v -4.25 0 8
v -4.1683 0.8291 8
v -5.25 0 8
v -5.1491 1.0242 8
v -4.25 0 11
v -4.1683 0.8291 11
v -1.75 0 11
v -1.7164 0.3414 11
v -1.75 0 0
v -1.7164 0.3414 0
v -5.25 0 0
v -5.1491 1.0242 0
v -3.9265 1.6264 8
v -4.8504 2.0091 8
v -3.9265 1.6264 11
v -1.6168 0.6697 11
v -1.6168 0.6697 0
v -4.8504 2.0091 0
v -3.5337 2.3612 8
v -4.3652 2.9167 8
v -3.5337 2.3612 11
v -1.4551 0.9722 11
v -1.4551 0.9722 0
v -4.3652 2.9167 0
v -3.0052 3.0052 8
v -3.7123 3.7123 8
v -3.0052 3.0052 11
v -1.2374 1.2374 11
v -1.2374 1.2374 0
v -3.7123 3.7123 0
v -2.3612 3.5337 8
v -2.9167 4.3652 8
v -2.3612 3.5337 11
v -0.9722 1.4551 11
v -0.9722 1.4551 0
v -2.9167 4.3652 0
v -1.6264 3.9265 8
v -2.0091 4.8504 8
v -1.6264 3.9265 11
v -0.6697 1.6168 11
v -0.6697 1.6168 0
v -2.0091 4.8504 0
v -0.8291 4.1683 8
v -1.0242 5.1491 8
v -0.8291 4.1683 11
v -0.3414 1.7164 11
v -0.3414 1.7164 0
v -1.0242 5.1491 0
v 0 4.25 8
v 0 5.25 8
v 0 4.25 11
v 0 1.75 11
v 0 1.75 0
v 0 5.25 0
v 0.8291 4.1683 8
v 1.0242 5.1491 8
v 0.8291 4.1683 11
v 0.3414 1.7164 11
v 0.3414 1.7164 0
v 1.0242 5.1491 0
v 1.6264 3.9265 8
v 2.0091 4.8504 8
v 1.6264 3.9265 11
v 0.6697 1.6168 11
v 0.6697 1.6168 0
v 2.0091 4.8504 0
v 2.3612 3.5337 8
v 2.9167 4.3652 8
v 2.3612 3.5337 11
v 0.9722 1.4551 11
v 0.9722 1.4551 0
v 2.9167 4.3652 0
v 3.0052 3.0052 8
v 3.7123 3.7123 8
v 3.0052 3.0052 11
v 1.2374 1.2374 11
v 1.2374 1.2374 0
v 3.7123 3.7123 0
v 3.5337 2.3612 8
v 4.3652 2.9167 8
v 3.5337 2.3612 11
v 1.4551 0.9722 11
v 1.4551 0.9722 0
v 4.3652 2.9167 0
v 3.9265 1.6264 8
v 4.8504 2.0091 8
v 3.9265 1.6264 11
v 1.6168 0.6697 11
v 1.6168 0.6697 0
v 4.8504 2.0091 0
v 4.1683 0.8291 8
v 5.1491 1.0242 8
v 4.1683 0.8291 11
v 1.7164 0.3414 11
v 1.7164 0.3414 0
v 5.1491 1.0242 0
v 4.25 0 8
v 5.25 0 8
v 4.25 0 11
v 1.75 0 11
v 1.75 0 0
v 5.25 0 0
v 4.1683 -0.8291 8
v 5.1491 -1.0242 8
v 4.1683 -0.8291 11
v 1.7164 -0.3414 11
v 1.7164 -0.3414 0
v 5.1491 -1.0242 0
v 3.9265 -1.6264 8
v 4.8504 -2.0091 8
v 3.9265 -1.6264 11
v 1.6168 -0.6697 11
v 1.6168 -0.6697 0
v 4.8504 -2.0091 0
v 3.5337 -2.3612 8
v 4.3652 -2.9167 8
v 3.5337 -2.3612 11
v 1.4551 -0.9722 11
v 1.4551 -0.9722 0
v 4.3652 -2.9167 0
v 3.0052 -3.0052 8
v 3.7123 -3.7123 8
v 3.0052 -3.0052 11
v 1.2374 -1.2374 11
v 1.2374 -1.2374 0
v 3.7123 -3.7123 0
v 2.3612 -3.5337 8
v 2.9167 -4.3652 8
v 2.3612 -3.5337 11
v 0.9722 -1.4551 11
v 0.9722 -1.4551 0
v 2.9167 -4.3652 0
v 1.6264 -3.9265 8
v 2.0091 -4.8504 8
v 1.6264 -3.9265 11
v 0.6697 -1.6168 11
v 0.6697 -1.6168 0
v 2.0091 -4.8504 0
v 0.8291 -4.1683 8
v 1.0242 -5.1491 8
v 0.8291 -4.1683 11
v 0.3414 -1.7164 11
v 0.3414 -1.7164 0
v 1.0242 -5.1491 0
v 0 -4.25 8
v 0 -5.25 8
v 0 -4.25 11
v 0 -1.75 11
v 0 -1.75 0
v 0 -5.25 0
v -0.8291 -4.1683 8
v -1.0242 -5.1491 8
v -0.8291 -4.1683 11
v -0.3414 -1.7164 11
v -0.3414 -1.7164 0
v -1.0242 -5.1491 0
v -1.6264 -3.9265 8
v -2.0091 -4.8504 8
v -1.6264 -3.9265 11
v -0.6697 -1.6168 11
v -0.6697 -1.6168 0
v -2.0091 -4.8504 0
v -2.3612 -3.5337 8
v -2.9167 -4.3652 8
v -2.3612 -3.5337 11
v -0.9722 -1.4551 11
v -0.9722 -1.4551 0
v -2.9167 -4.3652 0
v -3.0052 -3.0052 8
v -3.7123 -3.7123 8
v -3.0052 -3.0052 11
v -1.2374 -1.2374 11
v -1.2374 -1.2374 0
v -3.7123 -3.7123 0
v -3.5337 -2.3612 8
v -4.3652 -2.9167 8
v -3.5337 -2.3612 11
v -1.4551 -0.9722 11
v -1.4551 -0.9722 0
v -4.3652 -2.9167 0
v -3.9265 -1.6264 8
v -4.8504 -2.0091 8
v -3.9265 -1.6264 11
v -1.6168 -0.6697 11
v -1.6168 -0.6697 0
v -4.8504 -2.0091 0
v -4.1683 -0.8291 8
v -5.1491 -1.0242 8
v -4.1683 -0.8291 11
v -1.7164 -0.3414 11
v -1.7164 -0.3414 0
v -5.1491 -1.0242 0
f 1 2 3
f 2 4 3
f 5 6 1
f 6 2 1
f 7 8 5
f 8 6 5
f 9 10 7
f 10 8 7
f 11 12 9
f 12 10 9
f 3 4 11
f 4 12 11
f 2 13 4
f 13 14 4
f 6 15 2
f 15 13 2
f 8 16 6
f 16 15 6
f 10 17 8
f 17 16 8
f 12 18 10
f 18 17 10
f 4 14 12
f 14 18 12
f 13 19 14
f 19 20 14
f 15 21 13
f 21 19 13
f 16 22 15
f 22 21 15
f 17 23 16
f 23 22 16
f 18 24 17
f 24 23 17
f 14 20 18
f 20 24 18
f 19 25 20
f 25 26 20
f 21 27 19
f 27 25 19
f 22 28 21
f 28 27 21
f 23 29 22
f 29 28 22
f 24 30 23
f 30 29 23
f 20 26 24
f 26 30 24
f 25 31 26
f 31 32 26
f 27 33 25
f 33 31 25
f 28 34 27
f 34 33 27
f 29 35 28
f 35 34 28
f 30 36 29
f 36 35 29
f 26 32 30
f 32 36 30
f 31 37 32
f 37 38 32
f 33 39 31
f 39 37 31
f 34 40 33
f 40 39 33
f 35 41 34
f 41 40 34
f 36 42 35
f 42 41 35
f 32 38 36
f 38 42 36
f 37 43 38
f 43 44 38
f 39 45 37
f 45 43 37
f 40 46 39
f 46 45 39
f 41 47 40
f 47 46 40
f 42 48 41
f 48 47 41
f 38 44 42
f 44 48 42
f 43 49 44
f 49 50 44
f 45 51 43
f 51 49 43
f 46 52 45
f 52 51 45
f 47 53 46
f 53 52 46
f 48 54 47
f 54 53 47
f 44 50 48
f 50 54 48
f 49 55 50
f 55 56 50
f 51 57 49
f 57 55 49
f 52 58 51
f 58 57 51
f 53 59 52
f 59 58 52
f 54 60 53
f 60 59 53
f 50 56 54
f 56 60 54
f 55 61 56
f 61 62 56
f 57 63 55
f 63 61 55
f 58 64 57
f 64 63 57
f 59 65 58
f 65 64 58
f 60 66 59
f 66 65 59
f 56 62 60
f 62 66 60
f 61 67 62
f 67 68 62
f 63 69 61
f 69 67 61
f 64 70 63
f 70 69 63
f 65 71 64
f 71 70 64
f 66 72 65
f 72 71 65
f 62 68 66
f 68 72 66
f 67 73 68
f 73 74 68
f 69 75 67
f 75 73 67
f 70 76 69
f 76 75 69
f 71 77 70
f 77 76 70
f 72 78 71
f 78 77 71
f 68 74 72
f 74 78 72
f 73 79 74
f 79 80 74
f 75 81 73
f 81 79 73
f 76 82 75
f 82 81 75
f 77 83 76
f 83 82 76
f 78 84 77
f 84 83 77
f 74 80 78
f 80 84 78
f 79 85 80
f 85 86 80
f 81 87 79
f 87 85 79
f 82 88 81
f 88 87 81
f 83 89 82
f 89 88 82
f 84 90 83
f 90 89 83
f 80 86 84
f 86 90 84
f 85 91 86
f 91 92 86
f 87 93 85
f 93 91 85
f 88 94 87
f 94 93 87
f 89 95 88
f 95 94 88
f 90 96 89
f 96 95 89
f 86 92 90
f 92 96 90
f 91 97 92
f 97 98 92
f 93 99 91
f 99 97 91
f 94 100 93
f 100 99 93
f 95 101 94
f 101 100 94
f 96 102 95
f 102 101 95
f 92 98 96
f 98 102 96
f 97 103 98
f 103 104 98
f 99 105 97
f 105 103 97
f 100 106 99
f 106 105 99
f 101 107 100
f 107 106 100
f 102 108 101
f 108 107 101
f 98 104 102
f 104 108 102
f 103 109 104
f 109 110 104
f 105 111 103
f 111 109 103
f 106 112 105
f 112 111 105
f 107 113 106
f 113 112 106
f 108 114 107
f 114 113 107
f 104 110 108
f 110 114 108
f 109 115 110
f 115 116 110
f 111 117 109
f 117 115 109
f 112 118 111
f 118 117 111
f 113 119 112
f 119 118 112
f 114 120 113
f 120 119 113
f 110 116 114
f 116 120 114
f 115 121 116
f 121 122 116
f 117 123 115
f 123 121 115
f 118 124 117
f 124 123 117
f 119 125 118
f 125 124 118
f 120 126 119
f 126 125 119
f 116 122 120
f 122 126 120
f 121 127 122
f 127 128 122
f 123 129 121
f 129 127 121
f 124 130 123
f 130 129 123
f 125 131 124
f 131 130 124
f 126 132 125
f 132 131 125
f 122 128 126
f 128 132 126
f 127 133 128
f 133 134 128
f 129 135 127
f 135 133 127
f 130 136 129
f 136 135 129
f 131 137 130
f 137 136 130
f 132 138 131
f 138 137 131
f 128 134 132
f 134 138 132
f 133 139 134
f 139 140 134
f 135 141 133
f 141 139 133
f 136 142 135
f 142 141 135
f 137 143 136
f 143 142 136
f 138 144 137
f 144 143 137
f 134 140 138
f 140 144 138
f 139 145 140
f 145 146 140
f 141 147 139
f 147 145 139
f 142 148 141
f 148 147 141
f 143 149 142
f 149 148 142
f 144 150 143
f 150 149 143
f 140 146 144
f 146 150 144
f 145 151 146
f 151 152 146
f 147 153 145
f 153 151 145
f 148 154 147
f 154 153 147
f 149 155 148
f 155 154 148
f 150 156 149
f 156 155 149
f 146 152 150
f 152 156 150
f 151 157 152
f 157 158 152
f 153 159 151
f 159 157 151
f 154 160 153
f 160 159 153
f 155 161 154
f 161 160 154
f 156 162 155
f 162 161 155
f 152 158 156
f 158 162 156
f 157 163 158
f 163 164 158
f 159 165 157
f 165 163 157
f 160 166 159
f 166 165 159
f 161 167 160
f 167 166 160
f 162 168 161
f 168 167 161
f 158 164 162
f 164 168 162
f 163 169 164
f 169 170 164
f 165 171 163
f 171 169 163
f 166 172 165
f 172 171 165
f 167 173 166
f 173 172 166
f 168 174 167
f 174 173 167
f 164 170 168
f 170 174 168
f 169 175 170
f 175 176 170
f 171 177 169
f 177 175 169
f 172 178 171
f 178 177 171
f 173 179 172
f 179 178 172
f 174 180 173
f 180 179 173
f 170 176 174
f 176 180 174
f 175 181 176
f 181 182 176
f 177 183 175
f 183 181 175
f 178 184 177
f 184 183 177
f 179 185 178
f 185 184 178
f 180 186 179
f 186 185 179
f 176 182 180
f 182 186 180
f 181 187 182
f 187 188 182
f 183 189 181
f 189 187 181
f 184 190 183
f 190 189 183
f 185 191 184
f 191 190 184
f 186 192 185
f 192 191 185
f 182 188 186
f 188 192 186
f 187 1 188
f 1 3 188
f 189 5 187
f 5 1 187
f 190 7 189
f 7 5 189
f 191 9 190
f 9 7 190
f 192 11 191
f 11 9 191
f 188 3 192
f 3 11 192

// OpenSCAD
$fn = 32;

// ----------------------------------------------------------------------
// Form washer: stepped_c washer, 10.5 mm outside, 3.5 mm bore
// ----------------------------------------------------------------------

// --- parameters (mm) ---
revolve_angle = 360;      // full turn around the Z axis
profile_points = 6;       // points of the closed outline

profile = [[1.75, 0], [5.25, 0], [5.25, 8], [4.25, 8], [4.25, 11], [1.75, 11]];  // single closed polygon, 6 points, counter clockwise

// --- the one profile operation ---
rotate_extrude(angle = revolve_angle) polygon(points = profile);
